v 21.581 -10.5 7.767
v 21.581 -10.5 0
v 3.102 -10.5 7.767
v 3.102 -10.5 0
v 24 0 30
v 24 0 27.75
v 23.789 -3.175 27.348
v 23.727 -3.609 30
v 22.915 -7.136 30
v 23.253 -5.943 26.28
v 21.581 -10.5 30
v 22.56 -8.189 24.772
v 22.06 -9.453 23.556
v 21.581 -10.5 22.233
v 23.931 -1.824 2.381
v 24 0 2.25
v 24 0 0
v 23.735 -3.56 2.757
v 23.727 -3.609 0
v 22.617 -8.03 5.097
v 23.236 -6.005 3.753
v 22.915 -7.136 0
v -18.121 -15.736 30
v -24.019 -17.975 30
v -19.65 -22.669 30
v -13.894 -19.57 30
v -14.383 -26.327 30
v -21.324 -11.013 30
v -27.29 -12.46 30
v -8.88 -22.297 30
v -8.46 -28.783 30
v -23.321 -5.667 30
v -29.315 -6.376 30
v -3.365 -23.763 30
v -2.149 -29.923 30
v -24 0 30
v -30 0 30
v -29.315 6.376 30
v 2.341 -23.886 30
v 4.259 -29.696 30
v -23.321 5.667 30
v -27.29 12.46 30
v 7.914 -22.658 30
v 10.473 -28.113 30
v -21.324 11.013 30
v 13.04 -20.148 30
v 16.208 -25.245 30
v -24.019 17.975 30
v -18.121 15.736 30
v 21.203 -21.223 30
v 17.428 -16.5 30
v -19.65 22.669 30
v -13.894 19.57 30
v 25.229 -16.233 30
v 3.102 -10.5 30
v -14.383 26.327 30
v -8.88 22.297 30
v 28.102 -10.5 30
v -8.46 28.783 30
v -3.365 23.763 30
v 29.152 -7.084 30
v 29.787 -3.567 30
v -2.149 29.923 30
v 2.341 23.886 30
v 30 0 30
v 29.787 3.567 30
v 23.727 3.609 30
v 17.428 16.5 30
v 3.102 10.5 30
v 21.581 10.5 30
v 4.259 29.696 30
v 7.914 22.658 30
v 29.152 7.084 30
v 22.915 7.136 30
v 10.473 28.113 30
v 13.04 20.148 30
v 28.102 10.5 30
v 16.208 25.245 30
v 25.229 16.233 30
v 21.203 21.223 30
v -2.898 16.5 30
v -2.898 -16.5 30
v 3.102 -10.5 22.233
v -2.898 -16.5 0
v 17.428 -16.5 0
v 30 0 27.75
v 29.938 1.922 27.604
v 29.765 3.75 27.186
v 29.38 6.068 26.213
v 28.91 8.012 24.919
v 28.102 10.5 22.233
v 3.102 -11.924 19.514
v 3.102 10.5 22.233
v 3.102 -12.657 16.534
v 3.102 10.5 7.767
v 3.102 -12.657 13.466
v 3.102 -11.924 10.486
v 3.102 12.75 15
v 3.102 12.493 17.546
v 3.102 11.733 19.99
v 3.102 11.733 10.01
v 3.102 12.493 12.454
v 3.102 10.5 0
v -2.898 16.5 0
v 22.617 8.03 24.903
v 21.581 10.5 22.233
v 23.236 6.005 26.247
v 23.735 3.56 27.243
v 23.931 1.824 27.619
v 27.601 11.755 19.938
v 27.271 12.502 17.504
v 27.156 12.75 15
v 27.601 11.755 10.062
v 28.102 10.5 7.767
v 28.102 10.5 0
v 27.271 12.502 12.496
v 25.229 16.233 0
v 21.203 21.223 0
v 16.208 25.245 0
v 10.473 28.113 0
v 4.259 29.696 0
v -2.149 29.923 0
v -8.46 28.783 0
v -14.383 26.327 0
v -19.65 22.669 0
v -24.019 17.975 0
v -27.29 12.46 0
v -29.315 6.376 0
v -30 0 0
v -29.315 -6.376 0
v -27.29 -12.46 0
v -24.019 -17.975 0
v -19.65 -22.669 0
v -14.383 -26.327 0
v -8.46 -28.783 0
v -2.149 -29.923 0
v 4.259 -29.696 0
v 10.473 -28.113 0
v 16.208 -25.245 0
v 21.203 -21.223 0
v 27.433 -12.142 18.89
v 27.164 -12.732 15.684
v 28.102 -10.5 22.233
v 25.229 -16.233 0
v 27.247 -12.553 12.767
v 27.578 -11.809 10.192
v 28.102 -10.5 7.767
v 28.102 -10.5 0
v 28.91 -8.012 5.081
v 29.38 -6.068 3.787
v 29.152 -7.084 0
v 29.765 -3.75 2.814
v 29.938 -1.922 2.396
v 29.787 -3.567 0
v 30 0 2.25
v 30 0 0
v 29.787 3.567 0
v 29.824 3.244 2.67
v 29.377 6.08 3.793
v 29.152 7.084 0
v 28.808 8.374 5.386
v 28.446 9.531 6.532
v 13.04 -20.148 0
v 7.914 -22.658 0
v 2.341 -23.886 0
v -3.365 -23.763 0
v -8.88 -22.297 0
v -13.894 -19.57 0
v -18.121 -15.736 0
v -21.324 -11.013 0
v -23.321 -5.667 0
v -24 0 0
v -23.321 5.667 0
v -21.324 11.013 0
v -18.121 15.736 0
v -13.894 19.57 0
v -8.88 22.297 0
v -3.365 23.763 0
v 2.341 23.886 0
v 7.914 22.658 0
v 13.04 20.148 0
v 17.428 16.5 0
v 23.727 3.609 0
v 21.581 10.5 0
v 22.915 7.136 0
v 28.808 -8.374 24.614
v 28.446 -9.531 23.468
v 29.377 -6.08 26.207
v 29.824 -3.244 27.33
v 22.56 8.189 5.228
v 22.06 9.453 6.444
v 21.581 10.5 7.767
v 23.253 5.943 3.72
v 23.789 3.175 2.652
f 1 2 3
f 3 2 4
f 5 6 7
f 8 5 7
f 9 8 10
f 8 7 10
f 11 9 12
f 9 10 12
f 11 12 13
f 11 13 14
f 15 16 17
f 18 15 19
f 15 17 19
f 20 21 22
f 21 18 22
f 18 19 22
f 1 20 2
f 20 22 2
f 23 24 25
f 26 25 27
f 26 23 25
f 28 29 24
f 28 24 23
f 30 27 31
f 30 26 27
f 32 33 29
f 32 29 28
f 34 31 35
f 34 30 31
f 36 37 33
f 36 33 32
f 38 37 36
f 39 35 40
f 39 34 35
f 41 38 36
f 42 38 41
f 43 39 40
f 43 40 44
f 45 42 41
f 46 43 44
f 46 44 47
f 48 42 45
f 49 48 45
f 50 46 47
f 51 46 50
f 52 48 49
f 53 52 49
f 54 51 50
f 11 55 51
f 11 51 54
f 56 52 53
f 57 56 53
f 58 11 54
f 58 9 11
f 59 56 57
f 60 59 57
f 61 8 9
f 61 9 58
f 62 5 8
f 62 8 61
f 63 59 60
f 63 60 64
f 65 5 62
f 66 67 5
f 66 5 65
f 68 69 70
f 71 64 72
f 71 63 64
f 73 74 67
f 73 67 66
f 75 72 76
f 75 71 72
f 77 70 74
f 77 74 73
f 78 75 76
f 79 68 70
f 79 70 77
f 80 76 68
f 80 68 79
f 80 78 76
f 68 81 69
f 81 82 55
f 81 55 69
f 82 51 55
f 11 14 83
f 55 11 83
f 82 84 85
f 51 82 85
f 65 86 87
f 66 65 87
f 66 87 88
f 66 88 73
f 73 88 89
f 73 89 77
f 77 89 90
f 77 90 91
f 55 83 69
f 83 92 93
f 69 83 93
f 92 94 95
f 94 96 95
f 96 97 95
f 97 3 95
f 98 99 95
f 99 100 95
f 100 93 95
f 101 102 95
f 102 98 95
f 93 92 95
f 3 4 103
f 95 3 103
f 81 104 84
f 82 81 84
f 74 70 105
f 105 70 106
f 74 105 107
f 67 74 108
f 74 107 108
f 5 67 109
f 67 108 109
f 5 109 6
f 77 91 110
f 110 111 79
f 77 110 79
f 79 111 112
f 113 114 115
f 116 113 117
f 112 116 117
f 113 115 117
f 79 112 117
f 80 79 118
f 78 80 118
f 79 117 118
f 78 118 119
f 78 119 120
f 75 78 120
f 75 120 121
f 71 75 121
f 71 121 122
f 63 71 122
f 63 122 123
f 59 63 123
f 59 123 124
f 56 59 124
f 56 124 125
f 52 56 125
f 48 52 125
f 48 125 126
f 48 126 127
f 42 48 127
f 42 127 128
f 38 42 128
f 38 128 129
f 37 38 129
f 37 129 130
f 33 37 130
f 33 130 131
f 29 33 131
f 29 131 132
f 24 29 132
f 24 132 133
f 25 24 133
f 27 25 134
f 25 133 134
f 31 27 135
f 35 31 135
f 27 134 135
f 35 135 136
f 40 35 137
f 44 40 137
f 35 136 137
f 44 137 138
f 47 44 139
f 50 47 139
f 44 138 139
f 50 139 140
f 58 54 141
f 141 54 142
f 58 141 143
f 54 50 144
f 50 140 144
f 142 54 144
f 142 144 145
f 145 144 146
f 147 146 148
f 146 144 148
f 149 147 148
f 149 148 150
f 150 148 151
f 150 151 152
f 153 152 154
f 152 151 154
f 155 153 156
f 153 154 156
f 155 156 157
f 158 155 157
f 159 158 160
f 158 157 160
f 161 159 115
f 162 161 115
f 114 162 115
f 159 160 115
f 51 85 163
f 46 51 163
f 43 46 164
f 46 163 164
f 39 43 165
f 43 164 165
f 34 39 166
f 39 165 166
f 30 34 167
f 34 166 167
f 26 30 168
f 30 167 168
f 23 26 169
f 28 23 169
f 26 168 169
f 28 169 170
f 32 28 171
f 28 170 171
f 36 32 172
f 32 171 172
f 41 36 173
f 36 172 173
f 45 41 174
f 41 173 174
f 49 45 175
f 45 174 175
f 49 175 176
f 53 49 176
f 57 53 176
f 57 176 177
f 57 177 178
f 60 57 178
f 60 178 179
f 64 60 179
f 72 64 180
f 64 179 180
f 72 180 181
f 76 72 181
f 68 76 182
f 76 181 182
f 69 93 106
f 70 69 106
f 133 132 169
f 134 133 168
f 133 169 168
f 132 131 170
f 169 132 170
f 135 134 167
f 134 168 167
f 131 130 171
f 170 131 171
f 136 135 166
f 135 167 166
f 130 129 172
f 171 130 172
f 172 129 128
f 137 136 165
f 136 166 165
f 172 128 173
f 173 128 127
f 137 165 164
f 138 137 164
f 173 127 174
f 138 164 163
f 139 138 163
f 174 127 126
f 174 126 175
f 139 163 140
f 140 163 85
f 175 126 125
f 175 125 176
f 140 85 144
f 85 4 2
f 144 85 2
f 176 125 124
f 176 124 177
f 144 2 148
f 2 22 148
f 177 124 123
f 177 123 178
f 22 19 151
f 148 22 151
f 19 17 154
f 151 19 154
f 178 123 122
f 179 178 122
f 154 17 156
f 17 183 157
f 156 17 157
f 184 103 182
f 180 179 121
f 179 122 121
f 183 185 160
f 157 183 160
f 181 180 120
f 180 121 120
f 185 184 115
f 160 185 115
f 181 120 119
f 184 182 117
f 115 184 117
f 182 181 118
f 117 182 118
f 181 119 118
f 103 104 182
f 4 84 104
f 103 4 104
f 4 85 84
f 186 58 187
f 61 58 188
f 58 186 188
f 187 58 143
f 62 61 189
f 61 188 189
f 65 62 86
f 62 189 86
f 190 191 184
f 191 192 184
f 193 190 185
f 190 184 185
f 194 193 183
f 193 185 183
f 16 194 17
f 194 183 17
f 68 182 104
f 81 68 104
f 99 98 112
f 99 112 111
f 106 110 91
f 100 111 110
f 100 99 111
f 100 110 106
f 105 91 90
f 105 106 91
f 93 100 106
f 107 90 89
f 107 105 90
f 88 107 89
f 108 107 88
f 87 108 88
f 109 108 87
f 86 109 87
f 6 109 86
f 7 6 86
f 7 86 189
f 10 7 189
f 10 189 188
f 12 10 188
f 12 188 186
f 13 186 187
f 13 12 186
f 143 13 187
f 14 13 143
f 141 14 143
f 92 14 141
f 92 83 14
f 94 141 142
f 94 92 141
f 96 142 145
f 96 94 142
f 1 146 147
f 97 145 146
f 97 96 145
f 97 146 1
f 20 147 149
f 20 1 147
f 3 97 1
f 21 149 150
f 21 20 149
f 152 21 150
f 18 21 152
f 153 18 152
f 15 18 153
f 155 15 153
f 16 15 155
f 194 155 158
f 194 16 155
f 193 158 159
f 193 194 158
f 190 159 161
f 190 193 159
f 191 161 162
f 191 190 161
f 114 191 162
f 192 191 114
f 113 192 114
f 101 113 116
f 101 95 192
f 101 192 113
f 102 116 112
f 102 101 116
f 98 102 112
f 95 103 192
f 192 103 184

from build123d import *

# Parameters (mm, degrees)
F1_DEPTH = 30
F2_R     = 12.75
F3_DEPTH = 30


with BuildPart() as f1:
    # F0 (on Top) → F1 (new body)
    with BuildSketch(Plane.XY):
        with BuildLine():
            ThreePointArc((28.1024909928, -10.5), (29.5218116804, -5.3350384355), (30, 0))
            ThreePointArc((30, 0), (29.5218116804, 5.3350384355), (28.1024909928, 10.5))
            Line((28.1024909928, 10.5), (28.1024909928, -10.5))
        make_face()
        with BuildLine():
            Line((21.5812418549, 10.5), (28.1024909928, 10.5))
            ThreePointArc((28.1024909928, 10.5), (26.747487876, 13.5857238424), (25.0549396327, 16.5))
            Line((25.0549396327, 16.5), (17.4284250579, 16.5))
            ThreePointArc((17.4284250579, 16.5), (19.7341969222, 13.6587507422), (21.5812418549, 10.5))
        make_face()
        with BuildLine():
            Line((28.1024909928, -10.5), (28.1024909928, 10.5))
            Line((28.1024909928, 10.5), (21.5812418549, 10.5))
            ThreePointArc((21.5812418549, 10.5), (23.3874945699, 5.3874945699), (24, 0))
            ThreePointArc((24, 0), (23.3874945699, -5.3874945699), (21.5812418549, -10.5))
            Line((21.5812418549, -10.5), (28.1024909928, -10.5))
        make_face()
        with BuildLine():
            ThreePointArc((25.0549396327, -16.5), (26.747487876, -13.5857238424), (28.1024909928, -10.5))
            Line((28.1024909928, -10.5), (21.5812418549, -10.5))
            ThreePointArc((21.5812418549, -10.5), (19.7341969222, -13.6587507422), (17.4284250579, -16.5))
            Line((17.4284250579, -16.5), (25.0549396327, -16.5))
        make_face()
        with BuildLine():
            Line((17.4284250579, 16.5), (25.0549396327, 16.5))
            ThreePointArc((25.0549396327, 16.5), (-30, 0), (25.0549396327, -16.5))
            Line((25.0549396327, -16.5), (17.4284250579, -16.5))
            ThreePointArc((17.4284250579, -16.5), (-24, 0), (17.4284250579, 16.5))
        make_face()
        with BuildLine():
            Line((3.1024909928, 10.5), (21.5812418549, 10.5))
            ThreePointArc((21.5812418549, 10.5), (19.7341969222, 13.6587507422), (17.4284250579, 16.5))
            Line((17.4284250579, 16.5), (-2.8975090072, 16.5))
            Line((-2.8975090072, 16.5), (-2.8975090072, -16.5))
            Line((-2.8975090072, -16.5), (17.4284250579, -16.5))
            ThreePointArc((17.4284250579, -16.5), (19.7341969222, -13.6587507422), (21.5812418549, -10.5))
            Line((21.5812418549, -10.5), (3.1024909928, -10.5))
            Line((3.1024909928, -10.5), (3.1024909928, 10.5))
        make_face()
    extrude(amount=F1_DEPTH)

    # F2 (on face) → F3 (cut)
    with BuildSketch(Plane.YZ.offset(3.1024909928)):
        with Locations((0, 15)):
            Circle(F2_R)
    extrude(amount=F3_DEPTH, mode=Mode.SUBTRACT)


solid = f1.part
